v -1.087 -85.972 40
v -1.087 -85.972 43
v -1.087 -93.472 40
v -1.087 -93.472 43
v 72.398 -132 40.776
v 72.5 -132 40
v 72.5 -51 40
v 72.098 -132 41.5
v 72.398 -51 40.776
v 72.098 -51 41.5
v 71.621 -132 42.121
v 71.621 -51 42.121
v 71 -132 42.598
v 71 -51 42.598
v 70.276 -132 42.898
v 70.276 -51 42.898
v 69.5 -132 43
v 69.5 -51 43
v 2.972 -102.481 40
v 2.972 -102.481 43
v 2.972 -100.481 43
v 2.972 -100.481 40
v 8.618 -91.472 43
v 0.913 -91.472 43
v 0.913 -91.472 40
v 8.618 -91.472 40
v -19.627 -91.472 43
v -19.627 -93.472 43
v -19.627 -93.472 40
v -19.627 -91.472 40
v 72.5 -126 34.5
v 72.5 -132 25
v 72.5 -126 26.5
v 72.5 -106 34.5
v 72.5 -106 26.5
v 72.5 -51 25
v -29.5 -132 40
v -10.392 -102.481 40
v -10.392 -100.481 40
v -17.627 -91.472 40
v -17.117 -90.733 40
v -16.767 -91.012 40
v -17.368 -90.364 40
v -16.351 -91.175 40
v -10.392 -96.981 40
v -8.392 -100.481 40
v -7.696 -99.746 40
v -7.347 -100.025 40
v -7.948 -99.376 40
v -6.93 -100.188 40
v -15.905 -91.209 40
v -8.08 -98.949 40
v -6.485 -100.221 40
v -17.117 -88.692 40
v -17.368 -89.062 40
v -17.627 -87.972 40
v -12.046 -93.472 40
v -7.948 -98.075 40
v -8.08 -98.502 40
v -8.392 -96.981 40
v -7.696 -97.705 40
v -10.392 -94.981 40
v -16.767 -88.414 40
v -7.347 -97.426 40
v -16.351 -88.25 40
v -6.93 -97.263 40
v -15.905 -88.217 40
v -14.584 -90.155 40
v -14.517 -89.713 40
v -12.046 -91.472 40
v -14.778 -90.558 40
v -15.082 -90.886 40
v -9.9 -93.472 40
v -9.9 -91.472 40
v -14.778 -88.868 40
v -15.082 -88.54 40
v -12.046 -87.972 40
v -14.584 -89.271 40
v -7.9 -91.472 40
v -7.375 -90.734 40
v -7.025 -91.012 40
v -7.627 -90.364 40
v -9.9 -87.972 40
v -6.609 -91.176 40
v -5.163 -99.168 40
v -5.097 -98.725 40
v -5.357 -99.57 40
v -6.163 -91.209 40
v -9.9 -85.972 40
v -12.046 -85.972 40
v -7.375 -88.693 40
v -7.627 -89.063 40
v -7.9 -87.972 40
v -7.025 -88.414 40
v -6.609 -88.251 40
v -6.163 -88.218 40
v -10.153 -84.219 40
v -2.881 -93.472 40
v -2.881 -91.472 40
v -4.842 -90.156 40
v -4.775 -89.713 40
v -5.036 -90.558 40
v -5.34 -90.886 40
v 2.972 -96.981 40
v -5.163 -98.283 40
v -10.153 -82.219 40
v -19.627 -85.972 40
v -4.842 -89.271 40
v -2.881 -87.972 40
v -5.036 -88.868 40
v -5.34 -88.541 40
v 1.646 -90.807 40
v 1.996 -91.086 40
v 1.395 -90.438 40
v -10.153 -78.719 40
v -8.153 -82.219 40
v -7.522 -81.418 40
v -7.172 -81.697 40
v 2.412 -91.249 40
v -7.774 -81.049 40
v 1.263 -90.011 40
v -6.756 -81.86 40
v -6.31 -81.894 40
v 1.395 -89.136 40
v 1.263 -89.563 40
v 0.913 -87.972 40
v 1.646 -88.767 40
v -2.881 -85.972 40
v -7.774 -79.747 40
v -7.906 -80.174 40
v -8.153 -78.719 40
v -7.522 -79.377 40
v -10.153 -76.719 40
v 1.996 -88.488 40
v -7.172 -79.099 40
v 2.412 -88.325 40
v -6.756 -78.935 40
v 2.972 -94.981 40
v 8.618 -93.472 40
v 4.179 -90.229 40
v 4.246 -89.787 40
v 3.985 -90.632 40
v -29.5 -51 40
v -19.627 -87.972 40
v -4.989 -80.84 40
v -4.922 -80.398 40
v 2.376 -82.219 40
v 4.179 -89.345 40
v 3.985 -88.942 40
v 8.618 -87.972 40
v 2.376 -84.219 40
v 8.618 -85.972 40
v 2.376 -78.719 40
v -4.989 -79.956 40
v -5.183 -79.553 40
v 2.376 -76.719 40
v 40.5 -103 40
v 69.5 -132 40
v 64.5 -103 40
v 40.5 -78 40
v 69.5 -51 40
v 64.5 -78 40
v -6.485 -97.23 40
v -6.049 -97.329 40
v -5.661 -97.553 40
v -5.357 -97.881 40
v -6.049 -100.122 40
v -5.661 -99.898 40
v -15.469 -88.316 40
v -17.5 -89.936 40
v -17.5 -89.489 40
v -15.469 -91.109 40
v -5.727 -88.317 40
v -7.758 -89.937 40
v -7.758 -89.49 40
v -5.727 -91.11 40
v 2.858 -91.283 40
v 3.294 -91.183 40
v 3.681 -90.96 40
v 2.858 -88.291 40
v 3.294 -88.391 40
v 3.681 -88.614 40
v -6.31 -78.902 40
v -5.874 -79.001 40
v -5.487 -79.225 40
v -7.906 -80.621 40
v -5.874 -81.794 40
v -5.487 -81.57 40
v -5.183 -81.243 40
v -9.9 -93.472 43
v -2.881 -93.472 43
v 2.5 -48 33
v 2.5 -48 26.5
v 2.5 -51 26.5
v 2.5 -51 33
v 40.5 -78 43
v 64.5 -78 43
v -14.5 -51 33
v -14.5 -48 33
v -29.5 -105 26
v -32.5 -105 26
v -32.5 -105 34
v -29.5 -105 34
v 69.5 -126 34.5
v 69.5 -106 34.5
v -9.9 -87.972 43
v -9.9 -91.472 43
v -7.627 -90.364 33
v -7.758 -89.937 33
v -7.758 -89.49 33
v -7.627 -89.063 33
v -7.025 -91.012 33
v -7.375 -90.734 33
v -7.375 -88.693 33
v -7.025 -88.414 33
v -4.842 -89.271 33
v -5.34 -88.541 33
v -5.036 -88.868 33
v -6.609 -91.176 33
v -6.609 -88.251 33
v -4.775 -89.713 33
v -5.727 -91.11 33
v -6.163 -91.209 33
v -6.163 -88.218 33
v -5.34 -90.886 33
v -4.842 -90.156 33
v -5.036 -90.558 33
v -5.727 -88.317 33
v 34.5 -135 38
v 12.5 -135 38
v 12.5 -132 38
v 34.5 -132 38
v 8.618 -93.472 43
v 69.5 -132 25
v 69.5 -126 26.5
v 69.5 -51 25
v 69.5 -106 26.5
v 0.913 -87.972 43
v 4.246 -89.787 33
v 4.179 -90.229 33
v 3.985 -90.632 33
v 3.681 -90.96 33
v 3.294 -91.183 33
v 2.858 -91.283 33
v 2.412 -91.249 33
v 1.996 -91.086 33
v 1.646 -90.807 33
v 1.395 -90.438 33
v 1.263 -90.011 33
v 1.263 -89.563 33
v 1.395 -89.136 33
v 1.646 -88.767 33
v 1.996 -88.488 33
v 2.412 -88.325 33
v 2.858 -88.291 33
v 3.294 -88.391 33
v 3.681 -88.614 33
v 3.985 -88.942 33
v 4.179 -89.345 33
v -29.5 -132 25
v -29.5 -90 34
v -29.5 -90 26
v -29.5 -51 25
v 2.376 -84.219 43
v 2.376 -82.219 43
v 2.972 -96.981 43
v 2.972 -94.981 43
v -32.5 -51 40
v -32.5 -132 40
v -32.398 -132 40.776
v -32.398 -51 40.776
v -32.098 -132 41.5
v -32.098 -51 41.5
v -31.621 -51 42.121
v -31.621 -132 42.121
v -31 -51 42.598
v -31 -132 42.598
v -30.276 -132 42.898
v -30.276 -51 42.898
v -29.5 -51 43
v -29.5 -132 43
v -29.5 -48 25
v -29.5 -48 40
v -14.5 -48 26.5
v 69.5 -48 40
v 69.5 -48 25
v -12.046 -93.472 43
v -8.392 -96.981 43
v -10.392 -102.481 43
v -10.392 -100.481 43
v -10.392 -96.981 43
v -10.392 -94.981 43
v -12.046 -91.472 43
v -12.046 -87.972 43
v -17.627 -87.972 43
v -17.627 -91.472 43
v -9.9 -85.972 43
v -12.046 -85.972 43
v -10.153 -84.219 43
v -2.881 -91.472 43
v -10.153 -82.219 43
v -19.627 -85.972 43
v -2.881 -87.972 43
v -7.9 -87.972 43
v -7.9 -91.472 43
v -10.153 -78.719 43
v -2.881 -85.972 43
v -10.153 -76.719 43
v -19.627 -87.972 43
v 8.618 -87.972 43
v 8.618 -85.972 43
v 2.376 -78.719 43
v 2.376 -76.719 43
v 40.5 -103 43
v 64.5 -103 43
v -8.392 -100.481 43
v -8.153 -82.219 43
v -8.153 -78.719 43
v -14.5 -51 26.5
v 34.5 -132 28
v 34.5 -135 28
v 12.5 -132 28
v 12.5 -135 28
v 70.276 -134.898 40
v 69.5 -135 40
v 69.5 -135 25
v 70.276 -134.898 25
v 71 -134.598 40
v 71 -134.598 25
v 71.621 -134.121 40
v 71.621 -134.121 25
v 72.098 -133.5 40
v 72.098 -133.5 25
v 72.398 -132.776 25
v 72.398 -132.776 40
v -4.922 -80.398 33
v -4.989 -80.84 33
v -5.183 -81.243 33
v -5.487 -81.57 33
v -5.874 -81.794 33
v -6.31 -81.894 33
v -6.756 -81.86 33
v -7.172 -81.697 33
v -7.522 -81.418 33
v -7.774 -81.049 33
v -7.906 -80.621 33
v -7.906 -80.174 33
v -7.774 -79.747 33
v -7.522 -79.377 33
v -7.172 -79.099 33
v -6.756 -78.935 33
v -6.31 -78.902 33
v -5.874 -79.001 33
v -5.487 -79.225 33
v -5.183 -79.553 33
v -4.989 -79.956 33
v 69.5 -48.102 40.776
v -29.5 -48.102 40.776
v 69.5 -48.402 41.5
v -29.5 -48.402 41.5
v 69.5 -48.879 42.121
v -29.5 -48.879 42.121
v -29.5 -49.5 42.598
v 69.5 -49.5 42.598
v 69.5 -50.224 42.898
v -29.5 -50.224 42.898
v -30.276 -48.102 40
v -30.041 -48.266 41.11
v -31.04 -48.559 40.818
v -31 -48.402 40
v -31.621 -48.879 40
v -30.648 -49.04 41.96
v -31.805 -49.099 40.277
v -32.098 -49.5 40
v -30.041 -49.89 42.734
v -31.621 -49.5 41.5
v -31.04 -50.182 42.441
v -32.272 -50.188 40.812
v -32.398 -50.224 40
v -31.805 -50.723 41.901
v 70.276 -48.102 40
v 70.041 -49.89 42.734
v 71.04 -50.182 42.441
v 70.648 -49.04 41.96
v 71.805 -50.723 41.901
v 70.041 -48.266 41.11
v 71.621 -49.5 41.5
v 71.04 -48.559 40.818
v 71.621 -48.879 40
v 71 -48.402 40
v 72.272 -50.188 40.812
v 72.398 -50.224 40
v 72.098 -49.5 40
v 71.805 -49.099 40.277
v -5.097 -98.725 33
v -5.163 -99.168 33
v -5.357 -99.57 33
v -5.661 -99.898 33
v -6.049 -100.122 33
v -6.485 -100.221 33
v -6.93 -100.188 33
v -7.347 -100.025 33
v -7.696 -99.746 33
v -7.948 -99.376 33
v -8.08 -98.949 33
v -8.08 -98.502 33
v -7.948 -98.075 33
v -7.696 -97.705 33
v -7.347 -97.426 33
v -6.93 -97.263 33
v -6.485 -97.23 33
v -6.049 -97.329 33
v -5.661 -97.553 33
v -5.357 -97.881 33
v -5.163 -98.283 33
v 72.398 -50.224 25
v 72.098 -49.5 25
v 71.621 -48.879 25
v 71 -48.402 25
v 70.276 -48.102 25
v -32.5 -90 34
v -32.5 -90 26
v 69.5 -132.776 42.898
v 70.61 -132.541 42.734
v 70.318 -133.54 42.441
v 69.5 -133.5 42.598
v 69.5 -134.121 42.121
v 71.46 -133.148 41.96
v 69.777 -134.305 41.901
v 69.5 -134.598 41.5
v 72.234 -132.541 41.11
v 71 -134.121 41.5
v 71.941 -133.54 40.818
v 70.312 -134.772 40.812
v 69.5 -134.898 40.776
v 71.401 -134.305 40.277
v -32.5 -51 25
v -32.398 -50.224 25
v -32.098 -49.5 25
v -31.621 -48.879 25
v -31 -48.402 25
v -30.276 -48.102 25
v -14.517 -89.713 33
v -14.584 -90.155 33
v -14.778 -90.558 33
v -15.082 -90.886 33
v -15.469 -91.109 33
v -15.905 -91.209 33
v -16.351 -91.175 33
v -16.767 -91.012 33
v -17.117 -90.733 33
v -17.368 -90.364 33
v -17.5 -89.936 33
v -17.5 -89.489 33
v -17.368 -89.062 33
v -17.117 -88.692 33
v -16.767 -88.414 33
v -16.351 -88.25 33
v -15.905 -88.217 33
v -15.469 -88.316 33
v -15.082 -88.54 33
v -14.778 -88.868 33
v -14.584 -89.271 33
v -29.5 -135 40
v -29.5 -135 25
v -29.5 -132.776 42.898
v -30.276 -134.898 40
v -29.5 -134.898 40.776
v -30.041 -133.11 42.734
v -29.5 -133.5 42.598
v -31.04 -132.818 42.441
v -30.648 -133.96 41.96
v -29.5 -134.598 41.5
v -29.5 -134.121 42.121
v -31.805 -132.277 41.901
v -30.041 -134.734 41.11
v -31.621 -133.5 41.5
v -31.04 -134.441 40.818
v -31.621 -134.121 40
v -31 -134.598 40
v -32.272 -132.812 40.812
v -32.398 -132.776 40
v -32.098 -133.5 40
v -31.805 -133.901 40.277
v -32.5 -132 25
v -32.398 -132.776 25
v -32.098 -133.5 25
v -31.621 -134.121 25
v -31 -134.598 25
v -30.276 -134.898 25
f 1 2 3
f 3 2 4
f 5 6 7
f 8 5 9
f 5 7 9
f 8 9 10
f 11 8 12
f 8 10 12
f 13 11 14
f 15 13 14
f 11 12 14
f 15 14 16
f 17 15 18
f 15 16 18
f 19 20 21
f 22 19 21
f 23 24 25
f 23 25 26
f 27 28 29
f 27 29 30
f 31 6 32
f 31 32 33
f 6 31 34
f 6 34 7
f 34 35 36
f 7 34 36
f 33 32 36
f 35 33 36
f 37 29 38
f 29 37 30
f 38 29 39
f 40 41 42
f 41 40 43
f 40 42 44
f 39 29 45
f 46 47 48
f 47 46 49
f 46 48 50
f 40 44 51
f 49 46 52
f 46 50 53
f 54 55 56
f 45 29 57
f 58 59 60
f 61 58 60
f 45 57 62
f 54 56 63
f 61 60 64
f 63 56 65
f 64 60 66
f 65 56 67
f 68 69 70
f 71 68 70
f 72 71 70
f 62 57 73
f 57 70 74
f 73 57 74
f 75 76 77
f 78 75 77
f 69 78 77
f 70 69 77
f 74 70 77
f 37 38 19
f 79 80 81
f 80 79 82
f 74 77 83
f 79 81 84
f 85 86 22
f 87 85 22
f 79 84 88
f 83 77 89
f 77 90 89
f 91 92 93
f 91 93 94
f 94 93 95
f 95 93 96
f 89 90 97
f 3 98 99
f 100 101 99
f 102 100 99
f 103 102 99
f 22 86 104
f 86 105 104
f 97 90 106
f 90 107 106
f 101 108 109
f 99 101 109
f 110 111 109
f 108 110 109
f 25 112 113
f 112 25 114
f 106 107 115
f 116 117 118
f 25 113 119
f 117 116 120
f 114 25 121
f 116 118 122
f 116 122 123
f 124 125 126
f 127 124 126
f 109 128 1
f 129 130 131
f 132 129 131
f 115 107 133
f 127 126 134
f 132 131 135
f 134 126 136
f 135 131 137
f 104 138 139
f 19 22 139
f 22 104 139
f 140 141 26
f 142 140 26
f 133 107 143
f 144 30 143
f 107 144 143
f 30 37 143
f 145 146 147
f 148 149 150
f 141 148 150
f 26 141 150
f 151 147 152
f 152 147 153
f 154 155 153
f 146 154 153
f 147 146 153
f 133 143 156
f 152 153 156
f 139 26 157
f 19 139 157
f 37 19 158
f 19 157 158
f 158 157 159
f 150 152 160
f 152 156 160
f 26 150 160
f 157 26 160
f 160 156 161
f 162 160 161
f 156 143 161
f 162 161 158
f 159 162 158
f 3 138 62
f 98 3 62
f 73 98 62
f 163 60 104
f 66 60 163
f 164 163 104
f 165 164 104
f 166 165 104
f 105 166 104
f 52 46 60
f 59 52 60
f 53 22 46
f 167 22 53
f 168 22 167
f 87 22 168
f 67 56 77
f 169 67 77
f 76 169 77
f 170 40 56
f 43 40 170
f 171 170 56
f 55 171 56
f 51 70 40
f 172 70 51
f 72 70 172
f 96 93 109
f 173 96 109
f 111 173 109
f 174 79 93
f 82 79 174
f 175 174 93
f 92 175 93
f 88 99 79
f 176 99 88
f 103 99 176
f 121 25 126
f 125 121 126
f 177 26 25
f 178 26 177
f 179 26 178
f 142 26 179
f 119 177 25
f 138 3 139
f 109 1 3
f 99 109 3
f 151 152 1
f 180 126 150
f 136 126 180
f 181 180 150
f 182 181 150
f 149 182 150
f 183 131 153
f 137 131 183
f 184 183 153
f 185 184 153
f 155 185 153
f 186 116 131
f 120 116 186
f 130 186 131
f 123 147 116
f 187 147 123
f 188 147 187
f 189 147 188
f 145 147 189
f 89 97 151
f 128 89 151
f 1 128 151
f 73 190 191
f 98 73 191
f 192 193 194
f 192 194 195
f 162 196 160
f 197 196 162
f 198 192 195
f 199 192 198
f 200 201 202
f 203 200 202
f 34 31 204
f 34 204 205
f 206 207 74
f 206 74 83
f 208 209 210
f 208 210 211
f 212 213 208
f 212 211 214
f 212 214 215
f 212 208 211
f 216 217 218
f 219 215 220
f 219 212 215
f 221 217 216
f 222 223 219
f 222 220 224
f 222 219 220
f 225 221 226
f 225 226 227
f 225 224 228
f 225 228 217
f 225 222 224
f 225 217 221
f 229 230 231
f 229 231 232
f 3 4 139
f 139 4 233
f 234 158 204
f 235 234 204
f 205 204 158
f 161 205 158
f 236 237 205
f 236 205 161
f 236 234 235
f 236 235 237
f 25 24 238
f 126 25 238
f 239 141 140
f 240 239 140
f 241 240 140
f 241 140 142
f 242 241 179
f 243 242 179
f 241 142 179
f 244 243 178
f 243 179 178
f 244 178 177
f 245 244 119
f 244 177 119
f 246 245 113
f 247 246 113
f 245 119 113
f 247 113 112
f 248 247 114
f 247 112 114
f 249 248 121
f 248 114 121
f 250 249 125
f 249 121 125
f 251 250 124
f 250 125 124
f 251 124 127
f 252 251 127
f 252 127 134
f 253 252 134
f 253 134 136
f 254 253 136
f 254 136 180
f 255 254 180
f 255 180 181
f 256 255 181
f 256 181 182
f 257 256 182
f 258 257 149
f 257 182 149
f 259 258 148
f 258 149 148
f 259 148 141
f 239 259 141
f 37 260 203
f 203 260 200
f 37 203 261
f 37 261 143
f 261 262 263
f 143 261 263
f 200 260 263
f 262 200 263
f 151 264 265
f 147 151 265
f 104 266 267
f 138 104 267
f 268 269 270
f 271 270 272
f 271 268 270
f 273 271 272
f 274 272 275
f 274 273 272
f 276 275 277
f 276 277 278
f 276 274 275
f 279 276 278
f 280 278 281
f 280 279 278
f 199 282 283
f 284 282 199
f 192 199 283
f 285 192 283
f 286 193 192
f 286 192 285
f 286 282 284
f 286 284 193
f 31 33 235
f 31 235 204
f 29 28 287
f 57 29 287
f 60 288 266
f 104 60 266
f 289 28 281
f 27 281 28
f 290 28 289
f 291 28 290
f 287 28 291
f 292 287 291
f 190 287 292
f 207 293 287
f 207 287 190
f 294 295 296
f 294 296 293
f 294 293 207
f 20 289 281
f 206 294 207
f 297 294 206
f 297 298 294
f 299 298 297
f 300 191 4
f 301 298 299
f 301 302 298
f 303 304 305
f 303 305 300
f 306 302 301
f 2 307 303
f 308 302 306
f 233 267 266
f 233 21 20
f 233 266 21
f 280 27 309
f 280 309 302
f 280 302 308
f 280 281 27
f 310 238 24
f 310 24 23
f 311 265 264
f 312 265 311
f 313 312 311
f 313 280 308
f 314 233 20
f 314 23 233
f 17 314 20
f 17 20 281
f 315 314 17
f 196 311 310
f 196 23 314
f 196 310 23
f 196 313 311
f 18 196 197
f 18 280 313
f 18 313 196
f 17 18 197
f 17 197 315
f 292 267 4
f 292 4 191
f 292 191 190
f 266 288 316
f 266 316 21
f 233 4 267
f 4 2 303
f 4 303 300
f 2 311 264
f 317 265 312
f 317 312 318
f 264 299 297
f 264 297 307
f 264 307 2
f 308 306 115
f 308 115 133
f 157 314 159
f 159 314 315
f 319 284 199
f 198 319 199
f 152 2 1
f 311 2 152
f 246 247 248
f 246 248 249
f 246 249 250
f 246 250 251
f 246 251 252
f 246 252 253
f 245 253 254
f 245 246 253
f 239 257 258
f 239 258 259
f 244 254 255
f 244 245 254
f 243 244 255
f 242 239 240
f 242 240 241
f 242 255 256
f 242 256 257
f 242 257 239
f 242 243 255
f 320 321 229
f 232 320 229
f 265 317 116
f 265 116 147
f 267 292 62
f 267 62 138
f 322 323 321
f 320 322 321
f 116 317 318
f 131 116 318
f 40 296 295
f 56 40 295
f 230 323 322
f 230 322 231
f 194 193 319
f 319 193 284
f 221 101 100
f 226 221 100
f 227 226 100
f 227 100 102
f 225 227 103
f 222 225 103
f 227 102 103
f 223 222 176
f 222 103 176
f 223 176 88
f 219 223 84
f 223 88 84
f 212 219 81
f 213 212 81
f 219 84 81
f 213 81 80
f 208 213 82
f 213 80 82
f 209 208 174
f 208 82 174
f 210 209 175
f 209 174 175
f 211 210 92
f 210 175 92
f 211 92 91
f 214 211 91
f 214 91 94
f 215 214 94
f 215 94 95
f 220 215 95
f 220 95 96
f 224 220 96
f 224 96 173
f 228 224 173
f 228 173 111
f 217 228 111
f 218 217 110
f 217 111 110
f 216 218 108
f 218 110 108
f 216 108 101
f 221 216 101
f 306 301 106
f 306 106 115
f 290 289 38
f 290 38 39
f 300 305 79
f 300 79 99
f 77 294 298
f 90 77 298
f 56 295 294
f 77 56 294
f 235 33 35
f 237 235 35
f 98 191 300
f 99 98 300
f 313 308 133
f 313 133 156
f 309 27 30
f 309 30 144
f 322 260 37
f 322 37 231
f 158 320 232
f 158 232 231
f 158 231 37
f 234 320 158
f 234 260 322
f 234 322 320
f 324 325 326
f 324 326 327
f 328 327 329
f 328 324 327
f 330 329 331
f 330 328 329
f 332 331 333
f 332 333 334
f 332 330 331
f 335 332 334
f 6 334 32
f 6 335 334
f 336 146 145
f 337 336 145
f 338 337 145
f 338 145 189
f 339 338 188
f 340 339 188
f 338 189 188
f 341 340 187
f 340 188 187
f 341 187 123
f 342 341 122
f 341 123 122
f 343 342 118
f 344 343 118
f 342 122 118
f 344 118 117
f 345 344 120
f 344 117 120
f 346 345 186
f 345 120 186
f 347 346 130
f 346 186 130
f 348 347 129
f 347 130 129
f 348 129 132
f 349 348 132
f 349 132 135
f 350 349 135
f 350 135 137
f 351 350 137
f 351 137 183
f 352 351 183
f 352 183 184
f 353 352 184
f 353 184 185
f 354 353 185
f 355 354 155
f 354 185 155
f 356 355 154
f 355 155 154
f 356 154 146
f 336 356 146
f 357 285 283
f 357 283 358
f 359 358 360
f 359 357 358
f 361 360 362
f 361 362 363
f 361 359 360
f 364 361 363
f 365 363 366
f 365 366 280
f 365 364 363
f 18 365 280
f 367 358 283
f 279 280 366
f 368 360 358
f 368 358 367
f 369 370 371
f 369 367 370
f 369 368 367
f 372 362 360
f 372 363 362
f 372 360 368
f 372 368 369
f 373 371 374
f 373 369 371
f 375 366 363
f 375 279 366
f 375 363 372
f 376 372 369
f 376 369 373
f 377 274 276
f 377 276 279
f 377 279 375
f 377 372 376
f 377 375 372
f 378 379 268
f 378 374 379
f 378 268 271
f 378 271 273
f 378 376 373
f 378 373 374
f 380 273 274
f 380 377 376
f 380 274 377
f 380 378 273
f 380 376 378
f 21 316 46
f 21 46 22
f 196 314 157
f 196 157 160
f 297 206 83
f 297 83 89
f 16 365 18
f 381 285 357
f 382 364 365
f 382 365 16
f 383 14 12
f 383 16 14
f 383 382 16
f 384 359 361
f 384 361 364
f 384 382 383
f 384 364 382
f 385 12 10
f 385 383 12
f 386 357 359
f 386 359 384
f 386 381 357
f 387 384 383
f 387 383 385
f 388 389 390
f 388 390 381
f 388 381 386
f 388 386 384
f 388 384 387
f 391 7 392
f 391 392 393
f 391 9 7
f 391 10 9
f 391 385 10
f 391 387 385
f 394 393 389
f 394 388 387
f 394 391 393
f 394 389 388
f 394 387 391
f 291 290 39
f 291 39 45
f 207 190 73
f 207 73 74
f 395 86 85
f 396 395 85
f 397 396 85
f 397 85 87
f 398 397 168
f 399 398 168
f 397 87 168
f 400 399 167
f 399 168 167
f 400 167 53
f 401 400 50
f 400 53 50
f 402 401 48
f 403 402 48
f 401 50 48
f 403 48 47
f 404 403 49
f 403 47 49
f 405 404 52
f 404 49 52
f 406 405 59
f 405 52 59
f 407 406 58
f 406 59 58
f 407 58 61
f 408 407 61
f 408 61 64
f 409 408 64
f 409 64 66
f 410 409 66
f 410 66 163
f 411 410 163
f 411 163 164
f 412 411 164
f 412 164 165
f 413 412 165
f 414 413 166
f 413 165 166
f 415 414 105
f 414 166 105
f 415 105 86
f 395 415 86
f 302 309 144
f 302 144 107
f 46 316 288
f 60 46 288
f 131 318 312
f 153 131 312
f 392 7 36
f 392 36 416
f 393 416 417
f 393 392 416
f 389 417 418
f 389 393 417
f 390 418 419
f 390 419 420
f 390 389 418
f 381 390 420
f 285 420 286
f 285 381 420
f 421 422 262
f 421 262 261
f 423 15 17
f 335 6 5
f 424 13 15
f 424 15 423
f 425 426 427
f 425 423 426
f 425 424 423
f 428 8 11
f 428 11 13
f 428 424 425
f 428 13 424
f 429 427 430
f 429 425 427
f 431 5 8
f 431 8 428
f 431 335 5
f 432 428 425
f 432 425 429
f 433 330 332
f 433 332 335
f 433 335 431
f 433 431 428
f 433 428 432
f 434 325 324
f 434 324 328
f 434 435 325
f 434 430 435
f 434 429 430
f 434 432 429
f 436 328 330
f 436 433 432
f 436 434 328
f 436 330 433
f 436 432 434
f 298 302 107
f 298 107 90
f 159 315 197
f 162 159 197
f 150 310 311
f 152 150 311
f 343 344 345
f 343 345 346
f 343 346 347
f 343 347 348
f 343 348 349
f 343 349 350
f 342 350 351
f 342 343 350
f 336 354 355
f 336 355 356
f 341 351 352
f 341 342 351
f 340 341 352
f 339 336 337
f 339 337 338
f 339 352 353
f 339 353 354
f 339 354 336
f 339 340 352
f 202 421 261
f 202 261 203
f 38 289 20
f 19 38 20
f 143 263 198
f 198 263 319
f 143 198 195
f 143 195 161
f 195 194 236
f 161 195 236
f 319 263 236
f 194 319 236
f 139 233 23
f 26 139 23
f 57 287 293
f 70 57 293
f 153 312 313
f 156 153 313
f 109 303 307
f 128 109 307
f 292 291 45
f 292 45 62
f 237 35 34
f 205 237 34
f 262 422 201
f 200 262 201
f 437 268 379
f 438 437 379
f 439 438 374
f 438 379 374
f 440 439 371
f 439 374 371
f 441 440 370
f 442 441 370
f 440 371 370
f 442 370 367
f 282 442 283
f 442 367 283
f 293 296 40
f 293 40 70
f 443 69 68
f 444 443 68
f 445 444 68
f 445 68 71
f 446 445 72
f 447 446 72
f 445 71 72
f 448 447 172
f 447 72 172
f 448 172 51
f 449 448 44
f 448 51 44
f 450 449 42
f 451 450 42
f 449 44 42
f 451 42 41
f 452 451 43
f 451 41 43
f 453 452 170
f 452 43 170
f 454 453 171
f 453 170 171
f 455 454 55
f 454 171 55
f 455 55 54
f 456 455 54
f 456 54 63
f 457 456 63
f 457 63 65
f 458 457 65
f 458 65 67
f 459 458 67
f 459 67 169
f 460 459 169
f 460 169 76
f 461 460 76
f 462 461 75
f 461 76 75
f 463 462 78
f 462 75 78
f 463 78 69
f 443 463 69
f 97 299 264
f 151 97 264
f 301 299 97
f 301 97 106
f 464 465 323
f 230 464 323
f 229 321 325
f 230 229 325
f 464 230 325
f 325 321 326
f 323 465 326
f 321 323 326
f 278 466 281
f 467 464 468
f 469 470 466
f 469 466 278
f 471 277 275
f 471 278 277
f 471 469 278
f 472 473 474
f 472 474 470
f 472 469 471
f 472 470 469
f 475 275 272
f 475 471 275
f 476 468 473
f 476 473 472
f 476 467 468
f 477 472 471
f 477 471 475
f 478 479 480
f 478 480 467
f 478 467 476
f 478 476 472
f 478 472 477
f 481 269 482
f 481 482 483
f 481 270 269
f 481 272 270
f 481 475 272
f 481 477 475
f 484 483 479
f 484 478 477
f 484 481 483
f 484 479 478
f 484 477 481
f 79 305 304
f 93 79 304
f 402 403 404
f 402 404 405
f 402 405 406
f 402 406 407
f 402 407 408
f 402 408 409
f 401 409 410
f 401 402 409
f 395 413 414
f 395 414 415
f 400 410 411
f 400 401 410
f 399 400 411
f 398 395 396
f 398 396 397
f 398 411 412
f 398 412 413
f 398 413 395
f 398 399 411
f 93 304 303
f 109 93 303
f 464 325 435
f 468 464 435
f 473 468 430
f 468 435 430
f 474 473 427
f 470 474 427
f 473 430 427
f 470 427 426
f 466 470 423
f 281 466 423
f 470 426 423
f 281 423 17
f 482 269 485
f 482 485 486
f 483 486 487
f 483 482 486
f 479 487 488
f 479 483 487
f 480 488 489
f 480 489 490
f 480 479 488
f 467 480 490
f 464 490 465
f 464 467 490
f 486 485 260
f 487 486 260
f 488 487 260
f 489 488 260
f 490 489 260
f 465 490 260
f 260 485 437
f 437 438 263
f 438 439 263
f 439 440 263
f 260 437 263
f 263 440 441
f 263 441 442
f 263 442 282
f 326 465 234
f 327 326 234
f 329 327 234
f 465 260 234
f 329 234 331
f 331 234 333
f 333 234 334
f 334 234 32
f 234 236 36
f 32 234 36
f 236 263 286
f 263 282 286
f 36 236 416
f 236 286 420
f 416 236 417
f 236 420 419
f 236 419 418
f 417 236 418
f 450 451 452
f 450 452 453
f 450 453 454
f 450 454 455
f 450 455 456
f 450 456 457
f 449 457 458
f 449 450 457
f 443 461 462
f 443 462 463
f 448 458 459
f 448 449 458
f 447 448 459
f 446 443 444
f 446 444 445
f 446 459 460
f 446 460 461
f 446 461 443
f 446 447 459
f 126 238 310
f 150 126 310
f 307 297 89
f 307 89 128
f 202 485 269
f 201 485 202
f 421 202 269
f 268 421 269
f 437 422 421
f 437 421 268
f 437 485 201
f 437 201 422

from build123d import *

# Parameters (mm, degrees)
SKETCH001_W     = 99
SKETCH001_H     = 81
PAD001_DEPTH    = 15
THICKNESS001_T  = 3
SKETCH003_R     = 1.6
POCKET001_DEPTH = 12.001
SKETCH005_W     = 24
SKETCH005_H     = 25
POCKET002_DEPTH = 18.001
SKETCH006_W     = 15
SKETCH006_H     = 8
POCKET003_DEPTH = 3
SKETCH007_W     = 17
SKETCH007_H     = 6.5
POCKET004_DEPTH = 3
SKETCH008_W     = 20
SKETCH008_H     = 8
POCKET005_DEPTH = 3
SKETCH009_W     = 22
SKETCH009_H     = 10
POCKET006_DEPTH = 3
SKETCH010_W     = 2
SKETCH010_H     = 3.5
SKETCH010_W_2   = 12.528473
SKETCH010_H_2   = 2
SKETCH010_W_3   = 9.705046
SKETCH010_W_4   = 7.019181
SKETCH010_W_5   = 13.364327
SKETCH010_W_6   = 7.581009
POCKET007_DEPTH = 3
SKETCH011_R     = 1.5
PAD002_DEPTH    = 7


with BuildPart() as part:
    # Sketch001 → Pad001 (new body)
    with BuildSketch(Plane.XY.offset(25)):
        with Locations((20, -91.5)):
            Rectangle(SKETCH001_W, SKETCH001_H)
    extrude(amount=PAD001_DEPTH)

    # Thickness001
    thickness001_openings = [part.faces().sort_by_distance(p)[0] for p in [
        (20, -91.5, 25),
    ]]
    offset(amount=THICKNESS001_T, openings=thickness001_openings)

    # Sketch003 (on Part__Feature) → Pocket001 (cut, through all)
    with BuildSketch(Plane(origin=(-200, 0, 37), x_dir=(1, 0, 0), z_dir=(0, 0, 1))):
        with Locations((180, -63)):
            Circle(SKETCH003_R)
        with Locations((254, -124)):
            Circle(SKETCH003_R)
    extrude(amount=-POCKET001_DEPTH, mode=Mode.SUBTRACT)

    # Sketch005 (on Face23 of Pocket001) → Pocket002 (cut, through all)
    with BuildSketch(Plane.XY.offset(43)):
        with Locations((52.5, -90.5)):
            Rectangle(SKETCH005_W, SKETCH005_H)
    extrude(amount=-POCKET002_DEPTH, mode=Mode.SUBTRACT)

    # Sketch006 (on Face10 of Pocket002) → Pocket003 (cut)
    with BuildSketch(Plane(origin=(-32.5, 0, 0), x_dir=(0, -1, 0), z_dir=(-1, 0, 0))):
        with Locations((97.5, 30)):
            Rectangle(SKETCH006_W, SKETCH006_H)
    extrude(amount=-POCKET003_DEPTH, mode=Mode.SUBTRACT)

    # Sketch007 (on Face12 of Pocket003) → Pocket004 (cut)
    with BuildSketch(Plane(origin=(0, -48, 0), x_dir=(-1, 0, 0), z_dir=(0, 1, 0))):
        with Locations((6, 29.75)):
            Rectangle(SKETCH007_W, SKETCH007_H)
    extrude(amount=-POCKET004_DEPTH, mode=Mode.SUBTRACT)

    # Sketch008 (on Face22 of Pocket004) → Pocket005 (cut)
    with BuildSketch(Plane.YZ.offset(72.5)):
        with Locations((-116, 30.5)):
            Rectangle(SKETCH008_W, SKETCH008_H)
    extrude(amount=-POCKET005_DEPTH, mode=Mode.SUBTRACT)

    # Sketch009 (on Face20 of Pocket005) → Pocket006 (cut)
    with BuildSketch(Plane.XZ.offset(135)):
        with Locations((23.5, 33)):
            Rectangle(SKETCH009_W, SKETCH009_H)
    extrude(amount=-POCKET006_DEPTH, mode=Mode.SUBTRACT)

    # Sketch010 (on Face43 of Pocket006) → Pocket007 (cut)
    with BuildSketch(Plane.XY.offset(43)):
        with Locations((-9.15269, -80.468796)):
            Rectangle(SKETCH010_W, SKETCH010_H)
        with Locations((-3.888453, -77.718796)):
            Rectangle(SKETCH010_W_2, SKETCH010_H_2)
        with Locations((-3.888453, -83.218796)):
            Rectangle(SKETCH010_W_2, SKETCH010_H_2)
        with Locations((-0.087345, -89.722328)):
            Rectangle(SKETCH010_W, SKETCH010_H)
        with Locations((3.765178, -86.972328)):
            Rectangle(SKETCH010_W_3, SKETCH010_H_2)
        with Locations((3.765178, -92.472328)):
            Rectangle(SKETCH010_W_3, SKETCH010_H_2)
        with Locations((-8.900494, -89.722328)):
            Rectangle(SKETCH010_W, SKETCH010_H)
        with Locations((-6.390904, -86.972328)):
            Rectangle(SKETCH010_W_4, SKETCH010_H_2)
        with Locations((-6.390904, -92.472328)):
            Rectangle(SKETCH010_W_4, SKETCH010_H_2)
        with Locations((-9.392209, -98.730659)):
            Rectangle(SKETCH010_W, SKETCH010_H)
        with Locations((-3.710045, -95.980659)):
            Rectangle(SKETCH010_W_5, SKETCH010_H_2)
        with Locations((-3.710045, -101.480659)):
            Rectangle(SKETCH010_W_5, SKETCH010_H_2)
        with Locations((-18.626614, -89.722328)):
            Rectangle(SKETCH010_W, SKETCH010_H)
        with Locations((-15.836109, -86.972328)):
            Rectangle(SKETCH010_W_6, SKETCH010_H_2)
        with Locations((-15.836109, -92.472328)):
            Rectangle(SKETCH010_W_6, SKETCH010_H_2)
    extrude(amount=-POCKET007_DEPTH, mode=Mode.SUBTRACT)

    # Sketch011 (on Face4 of Pocket007) → Pad002 (join)
    with BuildSketch(Plane(origin=(0, 0, 40), x_dir=(1, 0, 0), z_dir=(0, 0, -1))):
        with Locations((-6.596659, 98.725481)):
            Circle(SKETCH011_R)
        with Locations((2.745978, 89.787056)):
            Circle(SKETCH011_R)
        with Locations((-6.275136, 89.713417)):
            Circle(SKETCH011_R)
        with Locations((-6.42242, 80.397736)):
            Circle(SKETCH011_R)
        with Locations((-16.017, 89.712753)):
            Circle(SKETCH011_R)
    extrude(amount=PAD002_DEPTH)


solid = part.part
